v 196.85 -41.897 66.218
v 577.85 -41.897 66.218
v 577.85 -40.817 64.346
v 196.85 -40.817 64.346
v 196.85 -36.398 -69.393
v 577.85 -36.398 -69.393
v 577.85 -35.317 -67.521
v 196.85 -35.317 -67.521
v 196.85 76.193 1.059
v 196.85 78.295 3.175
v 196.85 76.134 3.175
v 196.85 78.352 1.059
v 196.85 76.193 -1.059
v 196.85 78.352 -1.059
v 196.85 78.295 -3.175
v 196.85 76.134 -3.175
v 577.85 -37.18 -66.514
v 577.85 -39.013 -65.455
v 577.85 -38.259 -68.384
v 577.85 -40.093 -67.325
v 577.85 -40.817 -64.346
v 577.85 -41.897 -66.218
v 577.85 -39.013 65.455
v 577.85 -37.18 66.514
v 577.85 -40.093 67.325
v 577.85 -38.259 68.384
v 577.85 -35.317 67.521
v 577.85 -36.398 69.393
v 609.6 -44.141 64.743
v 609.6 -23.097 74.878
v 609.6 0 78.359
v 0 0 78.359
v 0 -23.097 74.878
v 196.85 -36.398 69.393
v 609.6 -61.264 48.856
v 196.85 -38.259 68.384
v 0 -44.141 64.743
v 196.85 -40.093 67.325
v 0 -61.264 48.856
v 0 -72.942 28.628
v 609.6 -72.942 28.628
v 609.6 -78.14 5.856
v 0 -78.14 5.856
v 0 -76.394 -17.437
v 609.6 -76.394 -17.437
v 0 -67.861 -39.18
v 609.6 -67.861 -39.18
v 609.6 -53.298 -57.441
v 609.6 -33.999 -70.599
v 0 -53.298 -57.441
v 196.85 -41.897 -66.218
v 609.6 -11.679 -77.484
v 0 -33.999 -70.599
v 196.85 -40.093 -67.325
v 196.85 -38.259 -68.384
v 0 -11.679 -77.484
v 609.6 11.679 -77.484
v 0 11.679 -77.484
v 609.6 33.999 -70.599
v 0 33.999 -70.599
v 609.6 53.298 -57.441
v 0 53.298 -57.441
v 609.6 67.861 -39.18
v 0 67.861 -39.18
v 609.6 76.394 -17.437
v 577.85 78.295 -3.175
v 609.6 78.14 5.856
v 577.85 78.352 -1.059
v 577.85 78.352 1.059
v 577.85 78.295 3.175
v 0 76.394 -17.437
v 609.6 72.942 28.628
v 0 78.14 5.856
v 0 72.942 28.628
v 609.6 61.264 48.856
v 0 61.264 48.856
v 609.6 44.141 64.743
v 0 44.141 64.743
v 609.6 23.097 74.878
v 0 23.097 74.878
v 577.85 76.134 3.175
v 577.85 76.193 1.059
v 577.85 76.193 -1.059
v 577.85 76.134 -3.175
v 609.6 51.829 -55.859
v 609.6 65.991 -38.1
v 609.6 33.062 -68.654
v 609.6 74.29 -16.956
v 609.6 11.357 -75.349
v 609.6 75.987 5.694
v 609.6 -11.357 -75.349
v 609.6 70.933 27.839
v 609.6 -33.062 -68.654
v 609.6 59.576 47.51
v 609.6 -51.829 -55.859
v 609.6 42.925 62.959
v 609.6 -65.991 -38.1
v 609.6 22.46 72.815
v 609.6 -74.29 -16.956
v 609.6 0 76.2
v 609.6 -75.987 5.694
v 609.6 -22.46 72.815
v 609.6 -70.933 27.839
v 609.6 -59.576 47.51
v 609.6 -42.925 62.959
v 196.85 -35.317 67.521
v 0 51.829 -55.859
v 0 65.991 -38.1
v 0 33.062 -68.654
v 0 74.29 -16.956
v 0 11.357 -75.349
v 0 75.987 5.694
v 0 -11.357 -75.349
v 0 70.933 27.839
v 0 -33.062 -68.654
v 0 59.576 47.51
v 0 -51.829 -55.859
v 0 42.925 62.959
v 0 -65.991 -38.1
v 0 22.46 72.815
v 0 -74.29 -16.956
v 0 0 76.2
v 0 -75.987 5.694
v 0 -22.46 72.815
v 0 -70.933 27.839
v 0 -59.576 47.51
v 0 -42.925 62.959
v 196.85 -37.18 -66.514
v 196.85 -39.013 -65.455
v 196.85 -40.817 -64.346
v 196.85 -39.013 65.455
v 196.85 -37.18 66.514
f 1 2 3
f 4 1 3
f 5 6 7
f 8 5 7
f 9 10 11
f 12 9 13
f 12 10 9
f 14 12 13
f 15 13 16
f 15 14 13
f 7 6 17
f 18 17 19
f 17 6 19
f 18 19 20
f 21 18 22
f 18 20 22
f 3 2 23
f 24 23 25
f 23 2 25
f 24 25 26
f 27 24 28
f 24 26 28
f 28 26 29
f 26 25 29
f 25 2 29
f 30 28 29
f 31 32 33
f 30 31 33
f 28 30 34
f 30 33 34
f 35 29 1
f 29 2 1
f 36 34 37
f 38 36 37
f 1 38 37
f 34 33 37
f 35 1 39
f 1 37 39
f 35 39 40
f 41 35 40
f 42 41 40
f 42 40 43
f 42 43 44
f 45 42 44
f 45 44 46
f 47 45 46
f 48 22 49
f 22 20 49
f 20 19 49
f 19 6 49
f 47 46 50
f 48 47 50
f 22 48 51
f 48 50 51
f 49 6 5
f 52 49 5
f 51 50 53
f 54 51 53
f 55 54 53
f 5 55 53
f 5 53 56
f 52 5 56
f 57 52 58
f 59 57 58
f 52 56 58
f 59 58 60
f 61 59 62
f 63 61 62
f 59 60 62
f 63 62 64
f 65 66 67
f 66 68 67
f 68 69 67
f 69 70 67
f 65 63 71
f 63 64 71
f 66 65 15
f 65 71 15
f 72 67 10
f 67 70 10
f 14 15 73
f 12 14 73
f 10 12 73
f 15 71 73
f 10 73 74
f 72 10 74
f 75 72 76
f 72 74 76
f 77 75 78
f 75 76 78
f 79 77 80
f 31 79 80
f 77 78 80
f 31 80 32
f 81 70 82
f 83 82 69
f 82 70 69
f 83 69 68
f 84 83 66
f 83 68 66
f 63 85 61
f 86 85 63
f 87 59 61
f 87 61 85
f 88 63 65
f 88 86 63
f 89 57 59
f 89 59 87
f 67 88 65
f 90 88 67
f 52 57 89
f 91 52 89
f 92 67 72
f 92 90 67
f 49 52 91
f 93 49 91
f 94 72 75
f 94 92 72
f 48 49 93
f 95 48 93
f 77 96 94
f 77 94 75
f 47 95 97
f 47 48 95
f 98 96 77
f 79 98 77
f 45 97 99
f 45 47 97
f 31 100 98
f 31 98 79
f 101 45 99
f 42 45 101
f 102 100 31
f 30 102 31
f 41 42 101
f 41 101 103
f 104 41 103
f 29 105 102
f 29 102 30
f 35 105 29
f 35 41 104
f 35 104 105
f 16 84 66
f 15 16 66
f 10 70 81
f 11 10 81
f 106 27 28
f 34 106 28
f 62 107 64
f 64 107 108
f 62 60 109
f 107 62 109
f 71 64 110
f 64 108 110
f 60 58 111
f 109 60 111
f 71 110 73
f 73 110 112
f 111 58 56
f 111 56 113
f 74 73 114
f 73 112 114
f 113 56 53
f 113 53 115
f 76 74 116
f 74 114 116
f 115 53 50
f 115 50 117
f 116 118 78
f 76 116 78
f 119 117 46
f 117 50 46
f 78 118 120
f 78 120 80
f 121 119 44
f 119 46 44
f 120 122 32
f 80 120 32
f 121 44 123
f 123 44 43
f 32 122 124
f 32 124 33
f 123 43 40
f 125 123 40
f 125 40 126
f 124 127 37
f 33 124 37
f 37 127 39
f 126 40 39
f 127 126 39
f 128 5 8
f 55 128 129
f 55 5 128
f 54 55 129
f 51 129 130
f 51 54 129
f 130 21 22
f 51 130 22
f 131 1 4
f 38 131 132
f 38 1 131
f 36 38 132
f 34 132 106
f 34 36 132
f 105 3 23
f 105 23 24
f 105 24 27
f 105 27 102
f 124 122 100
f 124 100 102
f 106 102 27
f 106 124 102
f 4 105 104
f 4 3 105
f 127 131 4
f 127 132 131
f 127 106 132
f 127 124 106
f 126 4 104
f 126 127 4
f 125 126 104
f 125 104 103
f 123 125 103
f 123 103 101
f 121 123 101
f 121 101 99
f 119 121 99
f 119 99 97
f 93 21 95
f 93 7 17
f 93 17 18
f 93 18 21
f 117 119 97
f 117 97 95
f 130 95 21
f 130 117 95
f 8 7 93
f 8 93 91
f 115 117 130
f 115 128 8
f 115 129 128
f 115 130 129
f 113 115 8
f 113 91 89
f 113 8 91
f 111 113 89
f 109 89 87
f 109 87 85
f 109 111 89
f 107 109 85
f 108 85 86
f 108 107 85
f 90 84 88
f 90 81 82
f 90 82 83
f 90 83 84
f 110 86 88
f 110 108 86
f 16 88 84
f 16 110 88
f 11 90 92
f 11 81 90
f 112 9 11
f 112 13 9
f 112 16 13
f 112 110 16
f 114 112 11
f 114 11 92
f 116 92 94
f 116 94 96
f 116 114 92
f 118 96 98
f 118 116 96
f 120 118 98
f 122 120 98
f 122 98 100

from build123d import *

# Parameters (mm, degrees)
SKETCH1_R           = 78.359
SKETCH1_R_2         = 76.2
BOSS_EXTRUDE1_DEPTH = 609.6
CUT_EXTRUDE1_START  = -381
CUT_EXTRUDE1_DEPTH  = 381
CIRPATTERN1_COUNT   = 3


with BuildPart() as part:
    # Sketch1 → Boss-Extrude1 (new body)
    with BuildSketch(Plane(origin=(0, 0, 0), x_dir=(0, 0, -1), z_dir=(1, 0, 0))):
        with Locations(Location((0, 0, 0), (0, 0, 180))):
            Circle(SKETCH1_R)
        with Locations(Location((0, 0, 0), (0, 0, 180))):
            Circle(SKETCH1_R_2, mode=Mode.SUBTRACT)
    extrude(amount=BOSS_EXTRUDE1_DEPTH)

    # Sketch3 → Cut-Extrude1 (cut)
    with BuildSketch(Plane(origin=(577.85, 0, 0), x_dir=(0, 0, -1), z_dir=(1, 0, 0)).offset(CUT_EXTRUDE1_START)):
        with BuildLine():
            Line((-3.175, 78.294650239), (-3.175, 76.133825433))
            ThreePointArc((-3.175, 76.133825433), (0, 76.2), (3.175, 76.133825433))
            Line((3.175, 76.133825433), (3.175, 78.294650239))
            ThreePointArc((3.175, 78.294650239), (0, 78.359), (-3.175, 78.294650239))
        make_face()
    cut_extrude1 = extrude(amount=CUT_EXTRUDE1_DEPTH, mode=Mode.SUBTRACT)

    # CirPattern1: Cut-Extrude1 ×3 about axis
    cirpattern1_axis = Axis((0, 0, 0), (1, 0, 0))
    for i in range(1, CIRPATTERN1_COUNT):
        add(cut_extrude1.rotate(cirpattern1_axis, i * 360 / CIRPATTERN1_COUNT), mode=Mode.SUBTRACT)


solid = part.part
